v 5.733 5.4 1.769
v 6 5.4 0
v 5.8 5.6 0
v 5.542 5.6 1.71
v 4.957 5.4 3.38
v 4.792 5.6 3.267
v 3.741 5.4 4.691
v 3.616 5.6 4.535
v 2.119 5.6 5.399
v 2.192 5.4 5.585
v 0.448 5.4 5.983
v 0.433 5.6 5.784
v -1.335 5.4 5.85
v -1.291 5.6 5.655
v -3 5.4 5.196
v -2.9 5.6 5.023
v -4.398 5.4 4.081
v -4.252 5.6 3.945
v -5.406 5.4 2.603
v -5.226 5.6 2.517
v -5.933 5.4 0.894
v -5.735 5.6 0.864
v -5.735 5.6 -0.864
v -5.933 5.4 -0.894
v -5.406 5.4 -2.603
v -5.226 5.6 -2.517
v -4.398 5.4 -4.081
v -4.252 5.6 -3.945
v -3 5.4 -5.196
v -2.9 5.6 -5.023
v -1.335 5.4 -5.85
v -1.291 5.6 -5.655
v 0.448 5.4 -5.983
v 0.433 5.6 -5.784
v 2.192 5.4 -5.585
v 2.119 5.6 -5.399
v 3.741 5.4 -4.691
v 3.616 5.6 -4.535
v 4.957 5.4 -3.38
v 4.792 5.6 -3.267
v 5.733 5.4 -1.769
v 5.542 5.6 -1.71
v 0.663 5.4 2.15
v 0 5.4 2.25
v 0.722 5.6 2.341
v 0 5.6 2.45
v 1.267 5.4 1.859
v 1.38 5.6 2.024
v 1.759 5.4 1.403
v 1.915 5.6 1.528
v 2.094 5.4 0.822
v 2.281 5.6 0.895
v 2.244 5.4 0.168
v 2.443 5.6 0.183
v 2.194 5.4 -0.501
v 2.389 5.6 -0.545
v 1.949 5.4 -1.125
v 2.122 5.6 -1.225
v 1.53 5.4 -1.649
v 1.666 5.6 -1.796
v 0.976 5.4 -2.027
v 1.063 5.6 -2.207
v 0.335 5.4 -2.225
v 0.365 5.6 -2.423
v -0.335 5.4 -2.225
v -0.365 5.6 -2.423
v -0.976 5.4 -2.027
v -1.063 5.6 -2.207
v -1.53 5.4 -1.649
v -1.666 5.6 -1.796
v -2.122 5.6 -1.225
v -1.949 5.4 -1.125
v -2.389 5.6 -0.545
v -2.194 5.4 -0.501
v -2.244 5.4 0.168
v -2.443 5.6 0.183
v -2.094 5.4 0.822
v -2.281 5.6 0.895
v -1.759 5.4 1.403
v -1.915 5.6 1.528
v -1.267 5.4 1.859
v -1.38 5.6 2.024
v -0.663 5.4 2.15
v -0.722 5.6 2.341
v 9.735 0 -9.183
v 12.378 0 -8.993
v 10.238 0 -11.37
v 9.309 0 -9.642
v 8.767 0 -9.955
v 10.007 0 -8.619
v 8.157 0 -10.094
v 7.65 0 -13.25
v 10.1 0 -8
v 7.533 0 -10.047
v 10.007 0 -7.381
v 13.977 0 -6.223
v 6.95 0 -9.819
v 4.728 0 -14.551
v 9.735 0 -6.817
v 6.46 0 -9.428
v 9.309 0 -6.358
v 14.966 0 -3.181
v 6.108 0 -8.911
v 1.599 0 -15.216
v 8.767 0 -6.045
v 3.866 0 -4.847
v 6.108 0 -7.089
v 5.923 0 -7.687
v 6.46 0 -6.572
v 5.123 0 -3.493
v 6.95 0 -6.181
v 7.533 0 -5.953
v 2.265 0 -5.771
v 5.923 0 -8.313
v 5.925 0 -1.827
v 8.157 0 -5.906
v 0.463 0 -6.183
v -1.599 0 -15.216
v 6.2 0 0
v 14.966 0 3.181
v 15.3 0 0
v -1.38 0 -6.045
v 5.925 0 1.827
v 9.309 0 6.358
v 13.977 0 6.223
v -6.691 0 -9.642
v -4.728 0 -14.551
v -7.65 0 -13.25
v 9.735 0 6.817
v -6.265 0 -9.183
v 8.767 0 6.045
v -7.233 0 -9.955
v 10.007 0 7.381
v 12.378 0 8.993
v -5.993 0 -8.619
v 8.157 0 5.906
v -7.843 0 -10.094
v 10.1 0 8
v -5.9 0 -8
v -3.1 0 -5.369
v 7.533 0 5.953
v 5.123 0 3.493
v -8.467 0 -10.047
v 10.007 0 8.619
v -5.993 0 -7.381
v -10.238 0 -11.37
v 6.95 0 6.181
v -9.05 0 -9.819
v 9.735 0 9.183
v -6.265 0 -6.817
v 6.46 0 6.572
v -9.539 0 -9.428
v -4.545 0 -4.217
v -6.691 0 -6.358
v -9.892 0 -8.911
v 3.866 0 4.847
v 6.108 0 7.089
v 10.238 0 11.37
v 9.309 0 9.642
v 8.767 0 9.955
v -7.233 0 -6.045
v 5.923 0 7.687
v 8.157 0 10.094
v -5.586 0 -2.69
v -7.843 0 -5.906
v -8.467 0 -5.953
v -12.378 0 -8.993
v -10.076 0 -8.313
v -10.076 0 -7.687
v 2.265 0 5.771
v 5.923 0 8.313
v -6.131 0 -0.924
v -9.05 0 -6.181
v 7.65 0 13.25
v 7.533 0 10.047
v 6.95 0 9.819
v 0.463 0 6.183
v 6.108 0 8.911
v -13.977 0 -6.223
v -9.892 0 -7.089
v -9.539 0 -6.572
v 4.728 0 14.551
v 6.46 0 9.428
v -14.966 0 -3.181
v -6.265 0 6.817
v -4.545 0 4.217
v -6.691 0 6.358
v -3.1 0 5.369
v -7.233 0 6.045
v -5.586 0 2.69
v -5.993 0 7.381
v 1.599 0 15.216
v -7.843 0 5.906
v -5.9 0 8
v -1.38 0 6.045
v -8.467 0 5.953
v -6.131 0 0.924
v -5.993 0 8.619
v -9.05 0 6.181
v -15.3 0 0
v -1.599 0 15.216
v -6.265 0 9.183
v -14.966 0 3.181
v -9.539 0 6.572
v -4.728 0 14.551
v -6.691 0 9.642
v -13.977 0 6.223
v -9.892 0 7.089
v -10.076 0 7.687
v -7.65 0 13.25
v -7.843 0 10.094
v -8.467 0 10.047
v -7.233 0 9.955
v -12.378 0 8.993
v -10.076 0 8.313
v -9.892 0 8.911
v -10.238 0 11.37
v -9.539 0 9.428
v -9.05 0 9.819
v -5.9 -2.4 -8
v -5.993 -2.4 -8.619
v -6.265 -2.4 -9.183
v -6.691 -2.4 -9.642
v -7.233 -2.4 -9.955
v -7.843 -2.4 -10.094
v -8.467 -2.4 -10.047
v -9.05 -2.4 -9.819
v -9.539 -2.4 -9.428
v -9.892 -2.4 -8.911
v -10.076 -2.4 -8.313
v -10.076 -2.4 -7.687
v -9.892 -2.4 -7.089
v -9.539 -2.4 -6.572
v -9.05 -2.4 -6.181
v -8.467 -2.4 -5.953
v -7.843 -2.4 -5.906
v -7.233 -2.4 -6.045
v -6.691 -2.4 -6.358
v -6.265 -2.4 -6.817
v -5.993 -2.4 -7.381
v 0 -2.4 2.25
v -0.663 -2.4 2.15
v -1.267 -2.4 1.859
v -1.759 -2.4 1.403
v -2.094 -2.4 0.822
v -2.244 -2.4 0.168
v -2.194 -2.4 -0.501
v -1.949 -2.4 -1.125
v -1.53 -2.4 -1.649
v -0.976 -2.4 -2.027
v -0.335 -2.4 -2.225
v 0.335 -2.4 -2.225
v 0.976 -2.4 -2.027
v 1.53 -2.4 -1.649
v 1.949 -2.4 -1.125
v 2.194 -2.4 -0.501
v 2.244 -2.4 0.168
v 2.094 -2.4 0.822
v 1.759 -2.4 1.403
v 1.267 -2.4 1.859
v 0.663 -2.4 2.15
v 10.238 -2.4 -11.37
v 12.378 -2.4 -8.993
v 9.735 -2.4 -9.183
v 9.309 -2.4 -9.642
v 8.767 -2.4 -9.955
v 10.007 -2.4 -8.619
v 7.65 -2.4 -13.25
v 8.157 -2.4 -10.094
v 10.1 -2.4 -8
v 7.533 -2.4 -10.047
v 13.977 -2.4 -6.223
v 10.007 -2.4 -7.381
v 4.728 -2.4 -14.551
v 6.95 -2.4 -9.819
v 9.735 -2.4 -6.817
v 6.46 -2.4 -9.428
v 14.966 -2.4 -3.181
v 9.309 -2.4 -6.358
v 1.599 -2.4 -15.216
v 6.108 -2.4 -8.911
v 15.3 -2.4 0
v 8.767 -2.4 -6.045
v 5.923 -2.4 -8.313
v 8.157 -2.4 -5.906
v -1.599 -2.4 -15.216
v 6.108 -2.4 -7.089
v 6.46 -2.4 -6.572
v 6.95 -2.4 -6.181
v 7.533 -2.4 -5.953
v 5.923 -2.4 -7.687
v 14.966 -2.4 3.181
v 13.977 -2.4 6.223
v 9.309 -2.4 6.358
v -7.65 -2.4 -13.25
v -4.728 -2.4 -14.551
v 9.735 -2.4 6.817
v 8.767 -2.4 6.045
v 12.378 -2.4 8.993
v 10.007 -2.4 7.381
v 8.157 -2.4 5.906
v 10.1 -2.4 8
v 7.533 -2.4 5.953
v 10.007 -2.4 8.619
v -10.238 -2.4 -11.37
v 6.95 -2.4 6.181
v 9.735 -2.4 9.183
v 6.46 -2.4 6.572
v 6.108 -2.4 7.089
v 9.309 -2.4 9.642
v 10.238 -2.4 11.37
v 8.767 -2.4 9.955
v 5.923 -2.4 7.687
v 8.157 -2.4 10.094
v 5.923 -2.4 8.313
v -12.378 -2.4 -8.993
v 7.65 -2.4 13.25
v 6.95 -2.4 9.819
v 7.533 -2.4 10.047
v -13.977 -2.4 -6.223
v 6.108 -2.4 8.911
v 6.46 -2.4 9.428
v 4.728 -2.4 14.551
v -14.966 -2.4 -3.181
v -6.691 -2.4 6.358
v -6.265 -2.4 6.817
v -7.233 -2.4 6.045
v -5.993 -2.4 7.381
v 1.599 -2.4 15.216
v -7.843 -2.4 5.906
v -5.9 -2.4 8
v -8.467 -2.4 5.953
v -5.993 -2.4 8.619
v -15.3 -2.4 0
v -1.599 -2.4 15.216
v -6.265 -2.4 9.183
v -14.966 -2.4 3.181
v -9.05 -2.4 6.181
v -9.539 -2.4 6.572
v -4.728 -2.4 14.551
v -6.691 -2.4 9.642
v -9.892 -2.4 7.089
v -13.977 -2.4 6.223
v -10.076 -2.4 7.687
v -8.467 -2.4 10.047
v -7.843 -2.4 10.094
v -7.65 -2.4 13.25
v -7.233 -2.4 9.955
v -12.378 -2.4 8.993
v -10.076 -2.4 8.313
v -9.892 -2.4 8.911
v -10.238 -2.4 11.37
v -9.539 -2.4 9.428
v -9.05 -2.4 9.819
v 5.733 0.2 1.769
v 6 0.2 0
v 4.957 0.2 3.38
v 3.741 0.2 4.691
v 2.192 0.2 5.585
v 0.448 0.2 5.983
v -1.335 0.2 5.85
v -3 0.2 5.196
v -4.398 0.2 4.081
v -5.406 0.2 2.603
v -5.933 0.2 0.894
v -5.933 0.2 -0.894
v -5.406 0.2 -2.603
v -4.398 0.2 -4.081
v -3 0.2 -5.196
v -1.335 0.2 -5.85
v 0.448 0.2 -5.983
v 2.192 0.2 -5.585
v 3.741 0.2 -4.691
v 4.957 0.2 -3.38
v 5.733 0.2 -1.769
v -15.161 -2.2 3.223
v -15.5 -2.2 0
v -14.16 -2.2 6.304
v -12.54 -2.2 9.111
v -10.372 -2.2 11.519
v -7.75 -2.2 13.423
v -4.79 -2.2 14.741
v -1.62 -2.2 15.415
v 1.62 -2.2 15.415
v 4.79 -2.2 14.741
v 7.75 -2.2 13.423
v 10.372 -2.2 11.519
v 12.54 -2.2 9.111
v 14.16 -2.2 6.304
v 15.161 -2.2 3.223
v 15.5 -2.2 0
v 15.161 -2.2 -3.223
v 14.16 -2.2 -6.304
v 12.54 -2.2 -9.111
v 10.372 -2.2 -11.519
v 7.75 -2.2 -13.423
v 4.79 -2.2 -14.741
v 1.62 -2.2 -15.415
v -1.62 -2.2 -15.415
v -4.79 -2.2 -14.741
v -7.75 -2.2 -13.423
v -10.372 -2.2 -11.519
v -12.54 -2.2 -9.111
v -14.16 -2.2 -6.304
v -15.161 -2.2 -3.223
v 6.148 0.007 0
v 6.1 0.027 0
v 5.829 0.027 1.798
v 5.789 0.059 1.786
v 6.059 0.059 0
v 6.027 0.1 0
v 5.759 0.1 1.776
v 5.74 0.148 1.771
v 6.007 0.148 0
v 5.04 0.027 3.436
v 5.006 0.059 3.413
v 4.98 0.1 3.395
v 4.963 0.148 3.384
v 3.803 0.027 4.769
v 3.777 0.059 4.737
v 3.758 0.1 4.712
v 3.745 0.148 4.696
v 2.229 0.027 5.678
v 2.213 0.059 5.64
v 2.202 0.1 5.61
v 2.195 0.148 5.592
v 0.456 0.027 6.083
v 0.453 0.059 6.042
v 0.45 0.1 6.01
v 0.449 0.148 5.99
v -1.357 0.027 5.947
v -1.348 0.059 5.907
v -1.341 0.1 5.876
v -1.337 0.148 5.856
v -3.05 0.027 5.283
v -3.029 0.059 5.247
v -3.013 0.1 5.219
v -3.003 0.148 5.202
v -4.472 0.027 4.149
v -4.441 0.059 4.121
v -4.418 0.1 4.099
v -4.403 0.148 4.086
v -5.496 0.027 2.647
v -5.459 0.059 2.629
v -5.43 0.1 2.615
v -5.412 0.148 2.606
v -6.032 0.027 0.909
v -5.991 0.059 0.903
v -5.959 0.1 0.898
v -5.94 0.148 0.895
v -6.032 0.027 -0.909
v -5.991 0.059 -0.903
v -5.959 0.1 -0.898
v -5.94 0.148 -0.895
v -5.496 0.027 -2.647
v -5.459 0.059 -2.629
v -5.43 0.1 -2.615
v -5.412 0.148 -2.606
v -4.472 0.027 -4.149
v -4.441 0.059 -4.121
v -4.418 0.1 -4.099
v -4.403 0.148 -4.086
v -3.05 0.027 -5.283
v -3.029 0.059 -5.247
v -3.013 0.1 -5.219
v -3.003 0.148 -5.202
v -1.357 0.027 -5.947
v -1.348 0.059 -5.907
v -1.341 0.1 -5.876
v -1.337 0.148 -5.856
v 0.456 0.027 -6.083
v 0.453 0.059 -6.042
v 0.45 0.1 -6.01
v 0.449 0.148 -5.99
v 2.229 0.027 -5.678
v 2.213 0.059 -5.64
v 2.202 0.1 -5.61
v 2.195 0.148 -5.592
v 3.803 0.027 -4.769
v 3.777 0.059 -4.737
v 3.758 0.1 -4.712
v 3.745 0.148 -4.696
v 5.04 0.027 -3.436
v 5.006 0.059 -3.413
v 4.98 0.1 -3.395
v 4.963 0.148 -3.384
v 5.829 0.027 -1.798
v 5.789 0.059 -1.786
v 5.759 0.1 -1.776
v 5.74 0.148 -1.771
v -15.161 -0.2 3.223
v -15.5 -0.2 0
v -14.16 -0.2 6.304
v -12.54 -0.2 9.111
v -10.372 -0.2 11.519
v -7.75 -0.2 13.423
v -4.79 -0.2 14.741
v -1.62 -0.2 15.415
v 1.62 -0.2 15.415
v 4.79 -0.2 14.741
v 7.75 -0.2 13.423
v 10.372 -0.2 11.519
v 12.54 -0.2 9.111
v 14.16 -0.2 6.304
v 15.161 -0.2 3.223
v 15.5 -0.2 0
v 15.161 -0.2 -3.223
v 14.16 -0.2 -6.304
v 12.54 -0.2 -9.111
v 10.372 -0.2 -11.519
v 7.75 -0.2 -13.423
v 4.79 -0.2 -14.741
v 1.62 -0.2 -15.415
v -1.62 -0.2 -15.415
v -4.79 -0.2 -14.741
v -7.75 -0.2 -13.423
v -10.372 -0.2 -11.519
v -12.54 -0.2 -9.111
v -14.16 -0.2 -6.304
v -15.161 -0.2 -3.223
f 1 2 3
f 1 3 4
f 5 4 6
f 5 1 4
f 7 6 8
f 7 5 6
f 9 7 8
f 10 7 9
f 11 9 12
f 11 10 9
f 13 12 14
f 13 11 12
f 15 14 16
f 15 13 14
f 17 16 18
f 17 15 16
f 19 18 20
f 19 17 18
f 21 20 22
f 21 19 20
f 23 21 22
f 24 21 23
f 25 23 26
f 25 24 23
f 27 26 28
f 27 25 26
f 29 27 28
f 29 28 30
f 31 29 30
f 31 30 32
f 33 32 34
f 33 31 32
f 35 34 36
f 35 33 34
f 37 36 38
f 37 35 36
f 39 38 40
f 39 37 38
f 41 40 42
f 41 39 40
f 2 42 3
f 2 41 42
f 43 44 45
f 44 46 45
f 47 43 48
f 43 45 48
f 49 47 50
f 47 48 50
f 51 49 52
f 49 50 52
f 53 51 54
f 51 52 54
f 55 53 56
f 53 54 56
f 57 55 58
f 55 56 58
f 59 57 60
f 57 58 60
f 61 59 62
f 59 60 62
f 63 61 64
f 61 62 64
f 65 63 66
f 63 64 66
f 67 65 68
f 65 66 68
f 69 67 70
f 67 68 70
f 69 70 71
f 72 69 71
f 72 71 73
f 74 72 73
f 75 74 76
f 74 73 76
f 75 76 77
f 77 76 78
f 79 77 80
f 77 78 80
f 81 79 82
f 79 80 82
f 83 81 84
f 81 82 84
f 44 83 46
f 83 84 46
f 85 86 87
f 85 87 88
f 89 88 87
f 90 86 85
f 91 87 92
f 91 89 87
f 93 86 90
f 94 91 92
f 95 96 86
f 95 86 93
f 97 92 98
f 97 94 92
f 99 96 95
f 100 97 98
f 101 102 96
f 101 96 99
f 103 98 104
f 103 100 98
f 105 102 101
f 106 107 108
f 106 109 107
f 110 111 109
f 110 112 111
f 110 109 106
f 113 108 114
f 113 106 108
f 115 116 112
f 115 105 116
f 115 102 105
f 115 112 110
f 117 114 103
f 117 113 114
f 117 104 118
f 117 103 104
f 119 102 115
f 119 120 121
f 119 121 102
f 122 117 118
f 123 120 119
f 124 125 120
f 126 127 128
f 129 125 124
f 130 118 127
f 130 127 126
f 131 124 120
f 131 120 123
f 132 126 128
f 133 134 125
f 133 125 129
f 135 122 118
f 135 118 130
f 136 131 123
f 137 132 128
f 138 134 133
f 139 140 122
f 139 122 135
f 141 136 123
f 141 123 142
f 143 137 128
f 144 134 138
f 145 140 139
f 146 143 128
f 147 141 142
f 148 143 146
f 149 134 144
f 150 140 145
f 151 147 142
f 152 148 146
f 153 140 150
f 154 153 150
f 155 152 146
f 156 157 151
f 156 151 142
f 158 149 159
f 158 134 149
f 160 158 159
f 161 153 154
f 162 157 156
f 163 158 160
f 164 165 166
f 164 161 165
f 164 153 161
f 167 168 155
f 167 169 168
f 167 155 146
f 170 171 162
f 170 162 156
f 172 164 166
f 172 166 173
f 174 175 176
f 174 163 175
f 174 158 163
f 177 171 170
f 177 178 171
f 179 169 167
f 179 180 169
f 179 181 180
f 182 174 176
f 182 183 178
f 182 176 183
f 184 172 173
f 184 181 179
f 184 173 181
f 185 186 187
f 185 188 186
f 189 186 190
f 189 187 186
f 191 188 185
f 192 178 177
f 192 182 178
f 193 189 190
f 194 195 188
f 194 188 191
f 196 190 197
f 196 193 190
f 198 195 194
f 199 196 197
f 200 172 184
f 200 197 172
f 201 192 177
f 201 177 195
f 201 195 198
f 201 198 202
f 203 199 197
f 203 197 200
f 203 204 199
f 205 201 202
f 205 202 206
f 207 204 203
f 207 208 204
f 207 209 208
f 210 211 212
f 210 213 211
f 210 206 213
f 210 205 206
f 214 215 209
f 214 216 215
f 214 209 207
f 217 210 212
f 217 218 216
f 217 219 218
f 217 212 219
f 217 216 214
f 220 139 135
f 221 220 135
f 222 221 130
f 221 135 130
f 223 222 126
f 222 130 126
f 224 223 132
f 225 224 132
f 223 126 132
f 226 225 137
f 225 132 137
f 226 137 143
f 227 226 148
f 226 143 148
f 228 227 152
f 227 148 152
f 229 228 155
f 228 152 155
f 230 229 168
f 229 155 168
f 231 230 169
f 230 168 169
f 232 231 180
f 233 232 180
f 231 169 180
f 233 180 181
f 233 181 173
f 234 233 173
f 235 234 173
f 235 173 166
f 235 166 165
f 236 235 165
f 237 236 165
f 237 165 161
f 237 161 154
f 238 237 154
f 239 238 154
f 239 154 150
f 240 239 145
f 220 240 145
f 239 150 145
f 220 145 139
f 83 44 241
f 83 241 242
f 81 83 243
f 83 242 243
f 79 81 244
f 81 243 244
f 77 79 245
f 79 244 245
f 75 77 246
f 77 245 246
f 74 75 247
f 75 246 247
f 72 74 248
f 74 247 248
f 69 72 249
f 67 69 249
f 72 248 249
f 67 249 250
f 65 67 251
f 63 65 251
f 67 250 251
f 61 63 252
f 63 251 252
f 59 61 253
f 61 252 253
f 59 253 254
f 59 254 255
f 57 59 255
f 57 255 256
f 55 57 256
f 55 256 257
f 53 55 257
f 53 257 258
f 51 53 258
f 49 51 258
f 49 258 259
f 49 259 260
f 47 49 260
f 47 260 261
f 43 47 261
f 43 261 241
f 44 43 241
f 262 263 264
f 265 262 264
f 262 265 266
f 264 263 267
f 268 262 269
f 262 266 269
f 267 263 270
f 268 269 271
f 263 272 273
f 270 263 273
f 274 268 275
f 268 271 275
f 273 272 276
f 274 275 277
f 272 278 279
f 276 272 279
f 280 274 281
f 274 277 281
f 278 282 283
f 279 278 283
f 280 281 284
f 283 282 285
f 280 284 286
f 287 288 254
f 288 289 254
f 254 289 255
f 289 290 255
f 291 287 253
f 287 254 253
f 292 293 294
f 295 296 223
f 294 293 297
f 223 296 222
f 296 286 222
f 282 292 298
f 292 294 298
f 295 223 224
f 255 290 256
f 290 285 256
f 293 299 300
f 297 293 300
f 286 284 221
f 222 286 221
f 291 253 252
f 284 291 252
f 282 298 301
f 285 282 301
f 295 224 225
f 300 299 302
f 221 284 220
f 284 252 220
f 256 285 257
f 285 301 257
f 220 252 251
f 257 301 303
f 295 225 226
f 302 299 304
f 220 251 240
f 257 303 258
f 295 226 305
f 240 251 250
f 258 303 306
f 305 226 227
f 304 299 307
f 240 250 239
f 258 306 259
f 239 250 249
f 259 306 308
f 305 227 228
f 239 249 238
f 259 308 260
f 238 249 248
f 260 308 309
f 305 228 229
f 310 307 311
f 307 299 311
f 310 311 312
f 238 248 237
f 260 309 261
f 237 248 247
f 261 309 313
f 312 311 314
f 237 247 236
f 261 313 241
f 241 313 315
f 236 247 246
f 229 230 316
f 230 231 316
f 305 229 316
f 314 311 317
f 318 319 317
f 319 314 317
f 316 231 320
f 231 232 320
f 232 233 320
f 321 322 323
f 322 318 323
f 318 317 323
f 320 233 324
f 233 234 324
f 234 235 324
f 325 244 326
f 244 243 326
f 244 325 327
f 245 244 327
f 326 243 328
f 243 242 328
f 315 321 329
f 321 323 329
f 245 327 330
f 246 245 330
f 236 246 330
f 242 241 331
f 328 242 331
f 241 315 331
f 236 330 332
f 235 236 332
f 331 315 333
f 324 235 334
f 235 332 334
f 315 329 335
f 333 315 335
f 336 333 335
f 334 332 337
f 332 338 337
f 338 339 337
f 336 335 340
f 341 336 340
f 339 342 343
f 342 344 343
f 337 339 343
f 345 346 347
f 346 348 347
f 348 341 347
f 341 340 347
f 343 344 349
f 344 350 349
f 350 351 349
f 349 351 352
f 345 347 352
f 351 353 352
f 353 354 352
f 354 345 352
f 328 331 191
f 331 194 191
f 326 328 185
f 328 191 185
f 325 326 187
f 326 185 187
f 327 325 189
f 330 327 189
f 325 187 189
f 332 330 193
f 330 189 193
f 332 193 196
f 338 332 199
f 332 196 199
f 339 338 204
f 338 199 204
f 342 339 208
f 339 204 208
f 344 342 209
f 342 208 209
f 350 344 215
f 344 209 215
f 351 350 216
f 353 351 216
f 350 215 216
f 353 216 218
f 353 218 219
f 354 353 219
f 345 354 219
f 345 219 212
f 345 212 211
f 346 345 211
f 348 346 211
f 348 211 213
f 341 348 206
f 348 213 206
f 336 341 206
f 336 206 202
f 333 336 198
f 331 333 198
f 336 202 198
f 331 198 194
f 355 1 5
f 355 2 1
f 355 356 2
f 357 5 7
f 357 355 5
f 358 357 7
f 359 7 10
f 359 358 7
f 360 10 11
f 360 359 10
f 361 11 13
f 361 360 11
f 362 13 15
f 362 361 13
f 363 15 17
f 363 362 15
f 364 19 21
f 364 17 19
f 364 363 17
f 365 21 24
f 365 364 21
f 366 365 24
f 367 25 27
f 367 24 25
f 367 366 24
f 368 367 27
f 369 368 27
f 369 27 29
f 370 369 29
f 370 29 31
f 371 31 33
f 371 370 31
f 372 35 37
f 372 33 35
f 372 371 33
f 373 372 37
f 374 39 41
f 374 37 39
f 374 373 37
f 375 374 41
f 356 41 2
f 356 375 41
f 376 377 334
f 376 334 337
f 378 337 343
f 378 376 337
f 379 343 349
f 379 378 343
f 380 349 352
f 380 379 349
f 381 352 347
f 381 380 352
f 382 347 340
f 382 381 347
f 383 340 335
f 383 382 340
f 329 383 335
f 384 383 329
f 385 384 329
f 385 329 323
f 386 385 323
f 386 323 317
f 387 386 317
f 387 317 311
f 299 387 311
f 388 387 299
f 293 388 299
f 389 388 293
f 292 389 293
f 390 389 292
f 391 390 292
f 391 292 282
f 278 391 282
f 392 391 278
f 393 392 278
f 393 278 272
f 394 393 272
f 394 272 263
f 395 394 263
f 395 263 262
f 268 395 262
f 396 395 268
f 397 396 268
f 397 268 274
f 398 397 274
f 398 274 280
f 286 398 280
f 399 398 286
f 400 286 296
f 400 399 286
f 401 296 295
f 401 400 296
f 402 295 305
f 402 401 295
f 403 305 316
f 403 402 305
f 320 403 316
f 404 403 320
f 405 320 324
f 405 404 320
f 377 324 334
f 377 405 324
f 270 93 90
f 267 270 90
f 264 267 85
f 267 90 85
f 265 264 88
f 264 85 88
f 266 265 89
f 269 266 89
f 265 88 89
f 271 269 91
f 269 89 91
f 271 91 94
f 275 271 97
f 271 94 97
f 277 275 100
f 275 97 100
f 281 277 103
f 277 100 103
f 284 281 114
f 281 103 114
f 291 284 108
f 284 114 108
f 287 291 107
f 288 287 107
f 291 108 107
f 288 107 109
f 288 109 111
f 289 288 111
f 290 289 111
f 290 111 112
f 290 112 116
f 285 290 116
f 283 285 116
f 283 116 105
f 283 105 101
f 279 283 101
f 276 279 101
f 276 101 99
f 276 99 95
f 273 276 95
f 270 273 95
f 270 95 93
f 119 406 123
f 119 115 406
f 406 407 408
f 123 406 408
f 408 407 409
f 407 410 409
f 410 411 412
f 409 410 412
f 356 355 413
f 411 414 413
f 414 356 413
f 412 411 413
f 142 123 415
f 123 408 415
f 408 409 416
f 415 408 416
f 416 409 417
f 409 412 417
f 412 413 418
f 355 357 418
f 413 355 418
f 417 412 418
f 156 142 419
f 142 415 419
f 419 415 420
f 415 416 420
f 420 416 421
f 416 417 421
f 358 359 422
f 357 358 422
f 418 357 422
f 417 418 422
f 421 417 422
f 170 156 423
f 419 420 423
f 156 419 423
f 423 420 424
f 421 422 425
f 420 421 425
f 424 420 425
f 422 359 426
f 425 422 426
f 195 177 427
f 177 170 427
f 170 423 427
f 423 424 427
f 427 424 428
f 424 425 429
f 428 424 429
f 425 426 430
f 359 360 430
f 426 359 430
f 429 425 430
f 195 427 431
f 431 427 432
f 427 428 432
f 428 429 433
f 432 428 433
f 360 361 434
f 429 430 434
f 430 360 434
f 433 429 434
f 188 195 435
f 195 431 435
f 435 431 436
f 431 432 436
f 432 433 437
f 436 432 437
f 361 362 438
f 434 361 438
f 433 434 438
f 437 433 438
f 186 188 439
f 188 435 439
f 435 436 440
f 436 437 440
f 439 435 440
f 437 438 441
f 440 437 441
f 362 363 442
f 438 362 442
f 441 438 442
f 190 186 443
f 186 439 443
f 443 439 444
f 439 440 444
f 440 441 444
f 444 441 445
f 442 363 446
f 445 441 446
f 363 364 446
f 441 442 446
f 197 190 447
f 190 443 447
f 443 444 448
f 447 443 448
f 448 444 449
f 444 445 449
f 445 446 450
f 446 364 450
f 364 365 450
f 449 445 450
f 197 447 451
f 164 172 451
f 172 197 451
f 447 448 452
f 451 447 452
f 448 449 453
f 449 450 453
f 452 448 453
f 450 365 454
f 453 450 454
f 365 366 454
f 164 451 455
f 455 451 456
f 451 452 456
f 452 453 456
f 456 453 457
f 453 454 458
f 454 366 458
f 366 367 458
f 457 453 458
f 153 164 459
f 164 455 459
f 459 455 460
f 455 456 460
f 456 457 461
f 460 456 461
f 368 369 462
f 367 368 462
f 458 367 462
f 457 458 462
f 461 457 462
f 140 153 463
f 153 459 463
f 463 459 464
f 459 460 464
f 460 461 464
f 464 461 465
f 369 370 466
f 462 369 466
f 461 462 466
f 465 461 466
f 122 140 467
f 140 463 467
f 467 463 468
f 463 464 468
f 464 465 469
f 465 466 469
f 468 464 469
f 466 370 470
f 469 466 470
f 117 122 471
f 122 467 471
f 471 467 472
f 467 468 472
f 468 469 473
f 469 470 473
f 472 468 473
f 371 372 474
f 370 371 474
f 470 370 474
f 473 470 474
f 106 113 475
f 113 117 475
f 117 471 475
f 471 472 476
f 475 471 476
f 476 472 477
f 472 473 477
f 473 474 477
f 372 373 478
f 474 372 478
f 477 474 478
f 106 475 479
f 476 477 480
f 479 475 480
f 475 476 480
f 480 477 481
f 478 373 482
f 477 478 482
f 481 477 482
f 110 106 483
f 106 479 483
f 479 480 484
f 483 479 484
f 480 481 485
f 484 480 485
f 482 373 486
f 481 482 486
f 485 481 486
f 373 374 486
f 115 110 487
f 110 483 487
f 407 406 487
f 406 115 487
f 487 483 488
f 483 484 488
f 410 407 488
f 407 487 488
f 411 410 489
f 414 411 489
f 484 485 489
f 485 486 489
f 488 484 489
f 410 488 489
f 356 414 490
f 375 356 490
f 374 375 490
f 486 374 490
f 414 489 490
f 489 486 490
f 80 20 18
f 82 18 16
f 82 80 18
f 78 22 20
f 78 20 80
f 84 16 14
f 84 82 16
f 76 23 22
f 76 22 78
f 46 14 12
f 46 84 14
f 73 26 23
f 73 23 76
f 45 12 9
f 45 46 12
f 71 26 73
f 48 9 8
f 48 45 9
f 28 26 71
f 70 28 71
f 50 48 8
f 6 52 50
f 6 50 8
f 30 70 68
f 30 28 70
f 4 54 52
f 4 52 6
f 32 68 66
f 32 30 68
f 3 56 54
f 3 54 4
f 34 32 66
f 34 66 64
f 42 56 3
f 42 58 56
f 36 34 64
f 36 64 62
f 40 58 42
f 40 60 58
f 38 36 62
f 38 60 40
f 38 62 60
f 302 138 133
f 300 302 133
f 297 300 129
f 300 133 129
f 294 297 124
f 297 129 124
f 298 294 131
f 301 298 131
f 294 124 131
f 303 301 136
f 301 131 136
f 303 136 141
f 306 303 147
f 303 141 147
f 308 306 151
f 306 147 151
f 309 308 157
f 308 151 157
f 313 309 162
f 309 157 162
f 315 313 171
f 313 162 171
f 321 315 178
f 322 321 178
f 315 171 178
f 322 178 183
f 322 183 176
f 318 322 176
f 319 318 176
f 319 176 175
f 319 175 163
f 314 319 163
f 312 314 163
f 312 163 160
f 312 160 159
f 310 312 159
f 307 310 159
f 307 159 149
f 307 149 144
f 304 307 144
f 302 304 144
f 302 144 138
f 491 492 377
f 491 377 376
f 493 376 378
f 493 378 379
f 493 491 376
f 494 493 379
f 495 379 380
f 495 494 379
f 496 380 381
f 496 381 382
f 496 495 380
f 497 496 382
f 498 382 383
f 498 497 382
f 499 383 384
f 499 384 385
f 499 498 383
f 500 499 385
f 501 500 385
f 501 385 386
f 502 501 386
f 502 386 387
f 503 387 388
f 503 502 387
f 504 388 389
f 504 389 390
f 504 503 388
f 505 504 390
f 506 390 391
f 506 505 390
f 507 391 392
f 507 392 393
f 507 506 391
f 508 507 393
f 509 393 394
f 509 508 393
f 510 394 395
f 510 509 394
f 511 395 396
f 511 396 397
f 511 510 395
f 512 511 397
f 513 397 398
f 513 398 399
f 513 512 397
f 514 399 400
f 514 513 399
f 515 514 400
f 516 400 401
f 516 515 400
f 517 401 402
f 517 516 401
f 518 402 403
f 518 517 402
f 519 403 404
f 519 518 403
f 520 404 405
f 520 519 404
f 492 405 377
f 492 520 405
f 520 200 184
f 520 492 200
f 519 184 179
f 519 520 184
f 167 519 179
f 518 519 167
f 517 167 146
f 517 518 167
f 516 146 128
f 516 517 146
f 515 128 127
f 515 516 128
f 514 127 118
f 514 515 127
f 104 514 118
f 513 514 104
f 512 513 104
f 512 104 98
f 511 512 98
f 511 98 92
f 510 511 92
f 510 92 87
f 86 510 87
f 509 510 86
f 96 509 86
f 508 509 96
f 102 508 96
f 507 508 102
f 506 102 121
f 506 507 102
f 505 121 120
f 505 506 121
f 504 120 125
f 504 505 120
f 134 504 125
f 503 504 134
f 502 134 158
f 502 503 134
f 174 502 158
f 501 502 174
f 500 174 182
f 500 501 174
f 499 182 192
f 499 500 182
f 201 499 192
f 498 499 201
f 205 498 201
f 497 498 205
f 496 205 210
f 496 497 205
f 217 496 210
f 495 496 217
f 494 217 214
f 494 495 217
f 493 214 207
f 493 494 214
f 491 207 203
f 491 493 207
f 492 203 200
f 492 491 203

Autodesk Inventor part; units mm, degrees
ref_plane "YZ Plane" through (0, 0, 0) normal (1, 0, 0) x (0, 1, 0)
ref_plane "XZ Plane" through (0, 0, 0) normal (0, 1, 0) x (-1, 0, 0)
ref_plane "XY Plane" through (0, 0, 0) normal (0, 0, 1) x (1, 0, 0)
sketch "Sketch1" plane through (0, 0, 0) normal (0, 1, 0) x (-1, 0, 0)
  circle A0 centre (0, 0) radius 15.5
  dimension "d0" = 31
extrude "Extrusion1" add sketch "Sketch1" against normal blind 2.4
sketch "Sketch2" plane through (0, 0, 0) normal (0, 1, 0) x (1, 0, 0)
  circle A0 centre (0, 0) radius 6
  dimension "d3" = 12
extrude "Extrusion2" add sketch "Sketch2" along normal blind 5.6
sketch "Sketch3" plane through (0, 0, 0) normal (0, 1, 0) x (1, 0, 0)
  circle A0 centre (0, 0) radius 2.1
  circle A1 centre (7.9999, -7.9999) radius 2.1
  circle A2 centre (7.9999, 7.9999) radius 2.1
  circle A3 centre (-7.9999, 7.9999) radius 2.1
  circle A4 centre (-7.9999, -7.9999) radius 2.1
  circle A5 centre (0, 0) radius 6.1
  circle A6 centre (0, 0) radius 15.4
  point P0 (0, 0)
extrude "Extrusion3" cut sketch "Sketch3" against normal blind 5.6 contours A1 | A2 | A3 | A4
sketch "Sketch4" plane through (0, 5.6, 0) normal (0, 1, 0) x (1, 0, 0)
  point P0 (0, 0)
hole "Hole1" at (0, 5.6, 0) direction (0, -1, 0) diameter 4.5 end through all
fillet "Fillet1" radius 0.2 1 edges at (-6, 0, 0)
chamfer "Chamfer1" distance 0.2 angle 45 4 edges at (15.5, -2.4, 0) (15.5, 0, 0) (-6, 5.6, 0) (0, 5.6, -2.25)
properties part number "08-0005" material "Aluminum 6061"
